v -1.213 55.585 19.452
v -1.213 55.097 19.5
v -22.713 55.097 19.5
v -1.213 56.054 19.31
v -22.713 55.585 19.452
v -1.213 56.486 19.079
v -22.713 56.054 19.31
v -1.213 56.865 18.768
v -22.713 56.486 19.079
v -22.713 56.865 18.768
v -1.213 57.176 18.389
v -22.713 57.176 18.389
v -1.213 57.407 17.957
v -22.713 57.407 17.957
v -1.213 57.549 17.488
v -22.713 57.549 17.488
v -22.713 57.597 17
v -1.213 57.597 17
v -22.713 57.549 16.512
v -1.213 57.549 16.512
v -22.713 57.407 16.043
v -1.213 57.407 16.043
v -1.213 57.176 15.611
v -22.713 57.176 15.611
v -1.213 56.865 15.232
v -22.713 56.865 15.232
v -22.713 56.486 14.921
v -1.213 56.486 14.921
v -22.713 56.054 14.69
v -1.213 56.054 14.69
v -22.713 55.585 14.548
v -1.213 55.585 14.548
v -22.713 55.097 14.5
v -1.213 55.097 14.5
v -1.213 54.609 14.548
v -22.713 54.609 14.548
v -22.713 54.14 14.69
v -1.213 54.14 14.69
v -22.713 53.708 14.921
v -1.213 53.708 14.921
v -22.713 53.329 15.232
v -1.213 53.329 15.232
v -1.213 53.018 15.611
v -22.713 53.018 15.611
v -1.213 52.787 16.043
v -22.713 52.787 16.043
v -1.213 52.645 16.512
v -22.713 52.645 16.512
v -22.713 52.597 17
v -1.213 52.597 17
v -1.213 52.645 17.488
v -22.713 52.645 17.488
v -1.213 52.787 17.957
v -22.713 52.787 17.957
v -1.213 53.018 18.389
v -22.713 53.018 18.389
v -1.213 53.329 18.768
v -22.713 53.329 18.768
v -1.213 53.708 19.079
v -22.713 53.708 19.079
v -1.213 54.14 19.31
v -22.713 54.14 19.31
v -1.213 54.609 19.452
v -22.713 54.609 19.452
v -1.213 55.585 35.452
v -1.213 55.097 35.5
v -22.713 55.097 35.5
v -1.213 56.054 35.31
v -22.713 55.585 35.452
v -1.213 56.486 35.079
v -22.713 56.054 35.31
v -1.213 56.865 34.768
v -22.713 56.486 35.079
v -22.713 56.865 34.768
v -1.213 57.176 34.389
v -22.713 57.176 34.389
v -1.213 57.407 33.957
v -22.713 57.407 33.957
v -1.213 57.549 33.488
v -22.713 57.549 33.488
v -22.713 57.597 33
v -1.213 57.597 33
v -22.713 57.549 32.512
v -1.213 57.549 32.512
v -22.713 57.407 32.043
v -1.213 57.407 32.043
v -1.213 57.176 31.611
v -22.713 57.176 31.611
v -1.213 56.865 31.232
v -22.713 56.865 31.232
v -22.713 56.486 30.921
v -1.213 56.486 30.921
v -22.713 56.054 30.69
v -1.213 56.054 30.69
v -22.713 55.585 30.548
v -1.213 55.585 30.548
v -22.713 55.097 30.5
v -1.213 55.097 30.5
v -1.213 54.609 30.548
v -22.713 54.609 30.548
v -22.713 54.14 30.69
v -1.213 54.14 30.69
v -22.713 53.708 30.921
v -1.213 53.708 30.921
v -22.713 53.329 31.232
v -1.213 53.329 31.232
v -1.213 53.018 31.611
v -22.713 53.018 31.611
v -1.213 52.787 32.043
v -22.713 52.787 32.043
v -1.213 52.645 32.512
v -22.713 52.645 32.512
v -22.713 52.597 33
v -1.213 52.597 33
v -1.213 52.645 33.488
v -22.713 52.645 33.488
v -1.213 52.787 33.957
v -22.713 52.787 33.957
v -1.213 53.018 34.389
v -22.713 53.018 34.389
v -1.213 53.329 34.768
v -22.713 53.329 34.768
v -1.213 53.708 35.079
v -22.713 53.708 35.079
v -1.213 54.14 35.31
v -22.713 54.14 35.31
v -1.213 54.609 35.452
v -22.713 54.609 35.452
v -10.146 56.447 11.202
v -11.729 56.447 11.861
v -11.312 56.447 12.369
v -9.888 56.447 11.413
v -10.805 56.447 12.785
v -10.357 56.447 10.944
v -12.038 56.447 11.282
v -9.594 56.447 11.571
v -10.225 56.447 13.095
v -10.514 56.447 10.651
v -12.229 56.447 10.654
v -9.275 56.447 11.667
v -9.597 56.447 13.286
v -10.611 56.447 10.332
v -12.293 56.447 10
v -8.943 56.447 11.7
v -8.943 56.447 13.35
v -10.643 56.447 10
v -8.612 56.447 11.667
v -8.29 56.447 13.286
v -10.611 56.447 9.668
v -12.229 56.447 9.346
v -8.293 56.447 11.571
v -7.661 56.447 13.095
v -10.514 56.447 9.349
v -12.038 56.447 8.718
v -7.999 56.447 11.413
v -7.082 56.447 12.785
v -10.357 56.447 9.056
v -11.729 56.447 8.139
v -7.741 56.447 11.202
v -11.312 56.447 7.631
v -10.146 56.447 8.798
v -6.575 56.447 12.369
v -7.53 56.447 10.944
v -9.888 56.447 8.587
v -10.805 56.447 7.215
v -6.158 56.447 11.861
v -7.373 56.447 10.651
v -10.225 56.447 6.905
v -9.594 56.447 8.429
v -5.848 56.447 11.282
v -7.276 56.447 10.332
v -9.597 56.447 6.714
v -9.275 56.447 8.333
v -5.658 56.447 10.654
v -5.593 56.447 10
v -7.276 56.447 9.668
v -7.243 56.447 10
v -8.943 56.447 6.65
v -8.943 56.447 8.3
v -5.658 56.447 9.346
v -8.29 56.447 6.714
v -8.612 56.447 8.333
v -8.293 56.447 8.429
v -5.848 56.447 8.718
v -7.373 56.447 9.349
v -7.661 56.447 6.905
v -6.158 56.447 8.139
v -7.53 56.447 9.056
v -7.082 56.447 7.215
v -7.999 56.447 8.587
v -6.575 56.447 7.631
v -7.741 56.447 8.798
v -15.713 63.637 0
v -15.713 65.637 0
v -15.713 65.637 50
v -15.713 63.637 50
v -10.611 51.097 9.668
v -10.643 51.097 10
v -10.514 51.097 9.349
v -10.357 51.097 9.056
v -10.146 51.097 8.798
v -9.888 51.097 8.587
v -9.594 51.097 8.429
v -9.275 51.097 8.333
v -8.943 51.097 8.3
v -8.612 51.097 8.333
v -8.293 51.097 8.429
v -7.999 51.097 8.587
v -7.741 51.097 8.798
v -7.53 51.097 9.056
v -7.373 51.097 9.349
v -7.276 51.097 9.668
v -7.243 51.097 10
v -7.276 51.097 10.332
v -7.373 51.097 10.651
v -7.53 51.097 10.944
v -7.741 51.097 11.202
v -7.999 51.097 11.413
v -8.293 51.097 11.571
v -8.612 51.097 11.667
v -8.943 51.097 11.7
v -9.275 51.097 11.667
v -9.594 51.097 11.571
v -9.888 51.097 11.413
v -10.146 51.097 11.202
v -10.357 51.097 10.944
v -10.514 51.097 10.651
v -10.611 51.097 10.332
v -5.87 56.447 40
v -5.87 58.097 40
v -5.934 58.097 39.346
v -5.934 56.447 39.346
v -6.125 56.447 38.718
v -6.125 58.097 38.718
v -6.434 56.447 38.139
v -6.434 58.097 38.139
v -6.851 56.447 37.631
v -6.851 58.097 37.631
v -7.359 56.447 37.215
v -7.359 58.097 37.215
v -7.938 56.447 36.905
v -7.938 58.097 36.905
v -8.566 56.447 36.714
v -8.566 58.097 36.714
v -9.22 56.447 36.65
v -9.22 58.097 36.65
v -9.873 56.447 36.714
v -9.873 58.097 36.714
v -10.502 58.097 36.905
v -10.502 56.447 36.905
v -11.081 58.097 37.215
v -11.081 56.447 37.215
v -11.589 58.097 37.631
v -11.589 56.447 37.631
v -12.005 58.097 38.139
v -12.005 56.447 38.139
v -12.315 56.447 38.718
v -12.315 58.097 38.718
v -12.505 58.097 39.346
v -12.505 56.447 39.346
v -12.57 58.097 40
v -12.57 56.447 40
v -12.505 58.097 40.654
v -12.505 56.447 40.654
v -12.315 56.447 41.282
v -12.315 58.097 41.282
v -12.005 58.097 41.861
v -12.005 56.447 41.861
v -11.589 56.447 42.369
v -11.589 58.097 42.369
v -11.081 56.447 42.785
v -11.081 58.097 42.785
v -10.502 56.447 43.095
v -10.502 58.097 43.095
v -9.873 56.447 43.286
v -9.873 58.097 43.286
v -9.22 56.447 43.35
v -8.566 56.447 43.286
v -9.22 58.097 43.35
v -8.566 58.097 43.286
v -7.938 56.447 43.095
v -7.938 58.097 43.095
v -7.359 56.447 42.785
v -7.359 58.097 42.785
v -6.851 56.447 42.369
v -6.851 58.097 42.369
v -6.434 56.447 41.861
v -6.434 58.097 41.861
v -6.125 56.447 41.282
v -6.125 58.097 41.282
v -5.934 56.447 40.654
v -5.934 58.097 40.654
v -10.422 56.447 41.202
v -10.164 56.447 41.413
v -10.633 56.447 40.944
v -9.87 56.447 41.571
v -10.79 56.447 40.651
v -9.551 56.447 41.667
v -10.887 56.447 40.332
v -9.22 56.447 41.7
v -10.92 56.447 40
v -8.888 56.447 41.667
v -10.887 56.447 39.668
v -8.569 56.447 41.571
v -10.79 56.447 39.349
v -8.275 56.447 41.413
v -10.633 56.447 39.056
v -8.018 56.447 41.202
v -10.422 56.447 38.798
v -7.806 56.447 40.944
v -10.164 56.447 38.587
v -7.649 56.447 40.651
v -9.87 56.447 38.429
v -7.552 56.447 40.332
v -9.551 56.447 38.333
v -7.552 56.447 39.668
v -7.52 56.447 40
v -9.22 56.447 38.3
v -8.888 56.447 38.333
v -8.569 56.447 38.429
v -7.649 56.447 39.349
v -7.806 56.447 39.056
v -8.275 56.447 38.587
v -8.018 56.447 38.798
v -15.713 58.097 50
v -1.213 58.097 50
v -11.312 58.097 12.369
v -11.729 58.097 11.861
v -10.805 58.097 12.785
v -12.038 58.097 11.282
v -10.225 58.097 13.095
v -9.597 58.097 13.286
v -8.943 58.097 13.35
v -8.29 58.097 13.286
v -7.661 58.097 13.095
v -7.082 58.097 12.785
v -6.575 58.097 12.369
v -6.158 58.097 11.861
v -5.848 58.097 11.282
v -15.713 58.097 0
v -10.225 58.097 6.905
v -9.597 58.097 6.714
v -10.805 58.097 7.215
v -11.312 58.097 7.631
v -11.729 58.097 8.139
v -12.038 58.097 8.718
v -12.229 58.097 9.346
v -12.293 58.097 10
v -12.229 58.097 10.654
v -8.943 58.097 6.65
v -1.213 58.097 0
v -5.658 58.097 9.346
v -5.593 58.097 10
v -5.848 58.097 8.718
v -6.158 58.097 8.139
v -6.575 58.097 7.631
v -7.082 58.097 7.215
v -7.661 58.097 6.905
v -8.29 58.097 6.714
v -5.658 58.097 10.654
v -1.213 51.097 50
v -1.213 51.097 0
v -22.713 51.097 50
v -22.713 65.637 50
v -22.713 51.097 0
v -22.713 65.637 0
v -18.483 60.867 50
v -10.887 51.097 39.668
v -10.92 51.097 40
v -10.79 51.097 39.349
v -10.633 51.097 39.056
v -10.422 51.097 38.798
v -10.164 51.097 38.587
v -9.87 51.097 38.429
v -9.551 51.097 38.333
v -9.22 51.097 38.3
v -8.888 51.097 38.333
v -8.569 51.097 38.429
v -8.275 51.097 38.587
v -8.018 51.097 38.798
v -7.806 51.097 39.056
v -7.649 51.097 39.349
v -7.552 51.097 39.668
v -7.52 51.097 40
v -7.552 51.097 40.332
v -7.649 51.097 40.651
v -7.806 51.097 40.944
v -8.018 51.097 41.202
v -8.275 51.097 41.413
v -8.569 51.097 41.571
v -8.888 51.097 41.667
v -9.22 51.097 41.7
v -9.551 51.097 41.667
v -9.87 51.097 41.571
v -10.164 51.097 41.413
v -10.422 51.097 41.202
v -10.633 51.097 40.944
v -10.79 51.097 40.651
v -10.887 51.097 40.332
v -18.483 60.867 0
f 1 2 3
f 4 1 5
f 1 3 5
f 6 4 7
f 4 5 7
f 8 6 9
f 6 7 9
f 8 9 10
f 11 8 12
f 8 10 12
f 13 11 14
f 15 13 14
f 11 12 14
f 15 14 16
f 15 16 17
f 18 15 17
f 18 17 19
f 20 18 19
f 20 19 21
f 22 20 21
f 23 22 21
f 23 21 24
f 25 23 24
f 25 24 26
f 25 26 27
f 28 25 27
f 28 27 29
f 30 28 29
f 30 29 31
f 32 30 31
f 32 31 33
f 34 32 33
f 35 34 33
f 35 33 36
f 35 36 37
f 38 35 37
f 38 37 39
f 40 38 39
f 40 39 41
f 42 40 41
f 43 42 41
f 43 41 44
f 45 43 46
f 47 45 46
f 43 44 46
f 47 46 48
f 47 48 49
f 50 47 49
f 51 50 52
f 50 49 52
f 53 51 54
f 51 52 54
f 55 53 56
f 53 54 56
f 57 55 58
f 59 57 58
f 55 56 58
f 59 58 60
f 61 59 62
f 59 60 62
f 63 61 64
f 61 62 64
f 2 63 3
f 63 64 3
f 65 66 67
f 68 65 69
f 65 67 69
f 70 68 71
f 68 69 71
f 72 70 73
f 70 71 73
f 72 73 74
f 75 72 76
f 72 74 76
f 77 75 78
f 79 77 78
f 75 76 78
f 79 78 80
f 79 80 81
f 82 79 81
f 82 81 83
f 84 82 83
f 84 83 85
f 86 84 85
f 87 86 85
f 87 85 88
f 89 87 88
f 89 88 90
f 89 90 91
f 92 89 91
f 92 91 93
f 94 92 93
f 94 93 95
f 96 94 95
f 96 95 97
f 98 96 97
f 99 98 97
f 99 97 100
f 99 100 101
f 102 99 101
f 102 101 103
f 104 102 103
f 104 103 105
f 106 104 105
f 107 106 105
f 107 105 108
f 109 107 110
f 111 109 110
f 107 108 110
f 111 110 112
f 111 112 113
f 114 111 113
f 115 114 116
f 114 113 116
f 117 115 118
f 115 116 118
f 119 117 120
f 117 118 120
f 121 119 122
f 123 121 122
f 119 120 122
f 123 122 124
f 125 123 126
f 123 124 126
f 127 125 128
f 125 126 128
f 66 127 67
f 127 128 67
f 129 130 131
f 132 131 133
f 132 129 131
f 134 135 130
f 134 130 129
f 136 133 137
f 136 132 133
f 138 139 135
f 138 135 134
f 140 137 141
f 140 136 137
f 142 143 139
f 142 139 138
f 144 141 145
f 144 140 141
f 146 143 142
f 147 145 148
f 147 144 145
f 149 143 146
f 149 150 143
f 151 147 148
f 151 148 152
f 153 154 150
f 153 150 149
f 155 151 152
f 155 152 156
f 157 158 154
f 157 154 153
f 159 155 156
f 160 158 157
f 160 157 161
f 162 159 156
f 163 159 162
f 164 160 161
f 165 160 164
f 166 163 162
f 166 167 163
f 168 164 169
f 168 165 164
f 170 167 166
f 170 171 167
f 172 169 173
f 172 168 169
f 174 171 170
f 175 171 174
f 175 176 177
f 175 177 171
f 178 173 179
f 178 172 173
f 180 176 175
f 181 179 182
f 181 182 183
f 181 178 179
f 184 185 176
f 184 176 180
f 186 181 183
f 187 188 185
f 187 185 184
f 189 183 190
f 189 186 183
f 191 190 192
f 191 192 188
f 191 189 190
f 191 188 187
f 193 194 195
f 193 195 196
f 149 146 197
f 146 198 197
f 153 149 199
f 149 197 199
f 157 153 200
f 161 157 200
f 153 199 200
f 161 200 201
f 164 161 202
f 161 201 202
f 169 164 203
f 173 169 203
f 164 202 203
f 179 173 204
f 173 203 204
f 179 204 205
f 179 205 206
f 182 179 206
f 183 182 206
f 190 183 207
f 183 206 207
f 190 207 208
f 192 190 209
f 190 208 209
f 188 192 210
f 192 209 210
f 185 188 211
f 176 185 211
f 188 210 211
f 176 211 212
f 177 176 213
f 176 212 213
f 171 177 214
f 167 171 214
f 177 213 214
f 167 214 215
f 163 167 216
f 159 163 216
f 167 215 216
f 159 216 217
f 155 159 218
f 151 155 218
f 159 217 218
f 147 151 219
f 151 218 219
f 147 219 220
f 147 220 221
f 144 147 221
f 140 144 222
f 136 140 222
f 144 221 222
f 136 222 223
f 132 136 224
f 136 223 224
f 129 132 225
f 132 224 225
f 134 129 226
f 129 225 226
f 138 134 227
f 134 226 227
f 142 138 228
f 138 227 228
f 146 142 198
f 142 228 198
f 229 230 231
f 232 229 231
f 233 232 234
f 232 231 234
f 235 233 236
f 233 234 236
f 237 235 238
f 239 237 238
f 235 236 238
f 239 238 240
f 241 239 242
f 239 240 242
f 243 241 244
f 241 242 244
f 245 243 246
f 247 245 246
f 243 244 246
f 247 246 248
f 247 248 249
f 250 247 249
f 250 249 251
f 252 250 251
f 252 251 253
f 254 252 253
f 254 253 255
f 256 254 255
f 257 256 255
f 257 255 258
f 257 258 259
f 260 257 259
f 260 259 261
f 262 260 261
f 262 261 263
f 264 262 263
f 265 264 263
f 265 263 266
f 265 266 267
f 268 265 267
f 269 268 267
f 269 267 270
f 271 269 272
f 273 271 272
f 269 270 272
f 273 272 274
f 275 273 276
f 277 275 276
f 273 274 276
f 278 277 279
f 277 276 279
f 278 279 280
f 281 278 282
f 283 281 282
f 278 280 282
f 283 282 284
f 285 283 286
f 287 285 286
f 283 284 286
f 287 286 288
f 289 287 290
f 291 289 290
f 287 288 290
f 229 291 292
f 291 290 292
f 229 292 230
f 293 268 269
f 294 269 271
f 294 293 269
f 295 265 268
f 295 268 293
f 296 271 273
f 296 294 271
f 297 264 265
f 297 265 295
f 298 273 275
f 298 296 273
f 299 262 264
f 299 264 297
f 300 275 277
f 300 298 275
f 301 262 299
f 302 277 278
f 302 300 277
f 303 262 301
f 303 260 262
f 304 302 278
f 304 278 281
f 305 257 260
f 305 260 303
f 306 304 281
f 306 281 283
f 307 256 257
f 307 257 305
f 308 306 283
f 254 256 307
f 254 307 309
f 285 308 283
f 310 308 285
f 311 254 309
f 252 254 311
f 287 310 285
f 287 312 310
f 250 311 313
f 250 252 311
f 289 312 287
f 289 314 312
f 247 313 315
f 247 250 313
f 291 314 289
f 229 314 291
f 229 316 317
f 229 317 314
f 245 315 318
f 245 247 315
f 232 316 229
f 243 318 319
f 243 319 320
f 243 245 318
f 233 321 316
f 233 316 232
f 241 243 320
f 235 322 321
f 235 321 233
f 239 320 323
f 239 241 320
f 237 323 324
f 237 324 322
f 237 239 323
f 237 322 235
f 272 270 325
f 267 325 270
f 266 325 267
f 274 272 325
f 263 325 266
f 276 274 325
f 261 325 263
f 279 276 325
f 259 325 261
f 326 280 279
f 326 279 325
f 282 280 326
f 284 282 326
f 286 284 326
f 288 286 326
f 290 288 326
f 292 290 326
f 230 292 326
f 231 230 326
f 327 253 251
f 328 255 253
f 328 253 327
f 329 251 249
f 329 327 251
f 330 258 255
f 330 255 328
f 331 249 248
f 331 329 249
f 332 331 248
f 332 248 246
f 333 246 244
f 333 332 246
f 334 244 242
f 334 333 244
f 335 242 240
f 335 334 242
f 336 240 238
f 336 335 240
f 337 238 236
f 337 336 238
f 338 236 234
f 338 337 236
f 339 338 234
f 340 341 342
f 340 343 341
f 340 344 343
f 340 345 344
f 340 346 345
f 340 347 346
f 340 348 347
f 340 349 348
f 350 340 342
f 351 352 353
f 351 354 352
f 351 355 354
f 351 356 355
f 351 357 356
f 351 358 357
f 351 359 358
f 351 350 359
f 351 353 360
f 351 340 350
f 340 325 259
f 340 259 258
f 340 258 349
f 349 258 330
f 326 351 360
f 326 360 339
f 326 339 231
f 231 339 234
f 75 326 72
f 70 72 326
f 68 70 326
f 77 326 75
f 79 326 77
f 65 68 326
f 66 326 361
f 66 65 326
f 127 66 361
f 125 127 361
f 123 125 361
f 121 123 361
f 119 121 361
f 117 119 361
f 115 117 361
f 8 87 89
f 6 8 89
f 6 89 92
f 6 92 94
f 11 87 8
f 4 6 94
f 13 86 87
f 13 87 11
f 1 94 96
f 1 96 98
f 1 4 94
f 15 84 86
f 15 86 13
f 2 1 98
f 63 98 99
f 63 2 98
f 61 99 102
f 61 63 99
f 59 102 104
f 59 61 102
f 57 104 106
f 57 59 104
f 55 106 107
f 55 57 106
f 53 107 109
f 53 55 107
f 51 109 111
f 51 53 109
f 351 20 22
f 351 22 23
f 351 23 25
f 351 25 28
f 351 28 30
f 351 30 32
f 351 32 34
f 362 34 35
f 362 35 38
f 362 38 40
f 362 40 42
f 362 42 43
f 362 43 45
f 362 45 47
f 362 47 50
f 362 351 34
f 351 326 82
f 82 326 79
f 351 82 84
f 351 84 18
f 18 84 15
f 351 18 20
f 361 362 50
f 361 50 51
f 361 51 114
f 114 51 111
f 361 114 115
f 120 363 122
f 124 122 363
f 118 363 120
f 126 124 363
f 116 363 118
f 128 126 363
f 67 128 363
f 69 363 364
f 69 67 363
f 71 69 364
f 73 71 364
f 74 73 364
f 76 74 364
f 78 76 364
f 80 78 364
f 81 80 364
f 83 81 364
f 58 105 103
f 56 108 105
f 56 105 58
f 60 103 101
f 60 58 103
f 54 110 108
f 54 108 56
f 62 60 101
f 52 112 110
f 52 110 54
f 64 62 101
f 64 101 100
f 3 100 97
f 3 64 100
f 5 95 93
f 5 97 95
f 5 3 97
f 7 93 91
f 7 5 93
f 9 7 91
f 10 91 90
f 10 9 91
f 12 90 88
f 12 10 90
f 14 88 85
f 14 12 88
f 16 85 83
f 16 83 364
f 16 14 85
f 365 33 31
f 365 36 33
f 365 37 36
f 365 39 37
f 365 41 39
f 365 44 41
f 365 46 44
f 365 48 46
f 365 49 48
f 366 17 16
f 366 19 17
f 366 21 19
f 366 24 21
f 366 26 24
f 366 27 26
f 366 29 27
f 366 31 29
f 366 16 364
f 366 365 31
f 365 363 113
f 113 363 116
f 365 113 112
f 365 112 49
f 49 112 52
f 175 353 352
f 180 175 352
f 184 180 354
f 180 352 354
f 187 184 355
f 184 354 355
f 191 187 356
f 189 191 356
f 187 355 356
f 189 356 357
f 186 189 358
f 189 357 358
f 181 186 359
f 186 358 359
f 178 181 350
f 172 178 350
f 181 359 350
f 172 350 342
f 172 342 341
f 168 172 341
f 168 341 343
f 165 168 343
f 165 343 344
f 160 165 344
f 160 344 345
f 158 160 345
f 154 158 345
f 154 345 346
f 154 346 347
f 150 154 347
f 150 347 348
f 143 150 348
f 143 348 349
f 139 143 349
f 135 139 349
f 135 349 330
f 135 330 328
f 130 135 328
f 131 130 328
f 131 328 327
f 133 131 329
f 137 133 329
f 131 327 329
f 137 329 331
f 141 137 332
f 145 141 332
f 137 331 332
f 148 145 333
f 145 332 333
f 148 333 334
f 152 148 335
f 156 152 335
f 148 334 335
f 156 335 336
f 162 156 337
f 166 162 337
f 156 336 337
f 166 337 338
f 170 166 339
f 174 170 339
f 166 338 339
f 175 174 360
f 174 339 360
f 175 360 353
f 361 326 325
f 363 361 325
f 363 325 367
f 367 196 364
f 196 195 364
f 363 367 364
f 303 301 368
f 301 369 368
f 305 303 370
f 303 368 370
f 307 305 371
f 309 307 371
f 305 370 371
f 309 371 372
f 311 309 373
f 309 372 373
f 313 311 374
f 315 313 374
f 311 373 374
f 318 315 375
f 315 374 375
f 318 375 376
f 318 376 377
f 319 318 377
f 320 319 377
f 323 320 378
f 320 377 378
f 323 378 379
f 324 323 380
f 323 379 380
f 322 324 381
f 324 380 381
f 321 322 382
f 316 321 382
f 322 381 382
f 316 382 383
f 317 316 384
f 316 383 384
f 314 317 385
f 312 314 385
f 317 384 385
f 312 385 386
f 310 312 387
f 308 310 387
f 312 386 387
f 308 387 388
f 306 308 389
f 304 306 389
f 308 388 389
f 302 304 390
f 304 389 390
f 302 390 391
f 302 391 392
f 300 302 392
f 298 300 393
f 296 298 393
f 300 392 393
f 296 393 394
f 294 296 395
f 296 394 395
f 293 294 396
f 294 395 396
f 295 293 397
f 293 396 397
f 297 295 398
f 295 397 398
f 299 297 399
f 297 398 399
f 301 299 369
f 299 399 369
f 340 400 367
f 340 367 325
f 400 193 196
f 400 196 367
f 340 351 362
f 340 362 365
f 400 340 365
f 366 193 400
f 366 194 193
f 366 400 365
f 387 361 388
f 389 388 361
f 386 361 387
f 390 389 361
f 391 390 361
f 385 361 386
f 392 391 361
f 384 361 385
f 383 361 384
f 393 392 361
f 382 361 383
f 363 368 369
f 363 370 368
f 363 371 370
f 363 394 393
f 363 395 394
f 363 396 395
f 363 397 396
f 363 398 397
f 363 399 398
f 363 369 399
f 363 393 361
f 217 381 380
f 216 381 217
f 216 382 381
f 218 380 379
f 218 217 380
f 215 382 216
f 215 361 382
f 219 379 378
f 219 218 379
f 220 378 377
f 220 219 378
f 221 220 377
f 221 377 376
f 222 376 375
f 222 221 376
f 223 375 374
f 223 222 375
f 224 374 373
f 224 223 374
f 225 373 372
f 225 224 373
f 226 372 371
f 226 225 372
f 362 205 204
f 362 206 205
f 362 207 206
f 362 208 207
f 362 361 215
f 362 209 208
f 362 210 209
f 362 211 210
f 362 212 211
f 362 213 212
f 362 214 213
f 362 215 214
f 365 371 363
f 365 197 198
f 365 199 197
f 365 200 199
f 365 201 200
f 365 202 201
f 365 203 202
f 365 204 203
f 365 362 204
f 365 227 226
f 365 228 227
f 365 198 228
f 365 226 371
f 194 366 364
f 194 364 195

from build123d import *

# Parameters (mm, degrees)
BOSS_EXTRUDE1_DEPTH             = 50
CUT_EXTRUDE1_REACH              = 23.5
SKETCH3_R                       = 2.5
CBORE_FOR_M3_SBHCS1_D           = 3.4
CBORE_FOR_M3_SBHCS1_CBORE_D     = 6.7
CBORE_FOR_M3_SBHCS1_CBORE_DEPTH = 1.65


with BuildPart() as part:
    # Sketch2 → Boss-Extrude1 (new body)
    with BuildSketch(Plane.XY):
        Polygon((-15.713485752, 63.637116303), (-18.483485752, 60.867117128), (-15.713485752, 58.097116303), (-1.213485752, 58.097116303), (-1.213485752, 51.097116303), (-22.713485752, 51.097116303), (-22.713485752, 65.637116303), (-15.713485752, 65.637116303), align=None)
    extrude(amount=BOSS_EXTRUDE1_DEPTH)

    # Sketch3 → Cut-Extrude1 (cut, up to next)
    with BuildSketch(Plane.ZY.offset(22.713485752), mode=Mode.PRIVATE) as cut_extrude1_sk1:
        with Locations((17, 55.097116303)):
            Circle(SKETCH3_R)
    cut_extrude1_tool1 = extrude(cut_extrude1_sk1.sketch, amount=-CUT_EXTRUDE1_REACH, mode=Mode.PRIVATE) & part.part
    add(cut_extrude1_tool1.solids().sort_by_distance((-22.713486, 55.097116, 17))[0], mode=Mode.SUBTRACT)
    # Sketch3 → Cut-Extrude1 (cut, up to next)
    with BuildSketch(Plane.ZY.offset(22.713485752), mode=Mode.PRIVATE) as cut_extrude1_sk2:
        with Locations((33, 55.097116303)):
            Circle(SKETCH3_R)
    cut_extrude1_tool2 = extrude(cut_extrude1_sk2.sketch, amount=-CUT_EXTRUDE1_REACH, mode=Mode.PRIVATE) & part.part
    add(cut_extrude1_tool2.solids().sort_by_distance((-22.713486, 55.097116, 33))[0], mode=Mode.SUBTRACT)

    # CBORE for M3 SBHCS1 (through all)
    with Locations(Plane(origin=(0, 58.097116303, 0), x_dir=(1, 0, 0), z_dir=(0, 1, 0))):
        with Locations((-9.219799779, -40), (-8.943485752, -10)):
            CounterBoreHole(CBORE_FOR_M3_SBHCS1_D / 2, CBORE_FOR_M3_SBHCS1_CBORE_D / 2, CBORE_FOR_M3_SBHCS1_CBORE_DEPTH)


solid = part.part
